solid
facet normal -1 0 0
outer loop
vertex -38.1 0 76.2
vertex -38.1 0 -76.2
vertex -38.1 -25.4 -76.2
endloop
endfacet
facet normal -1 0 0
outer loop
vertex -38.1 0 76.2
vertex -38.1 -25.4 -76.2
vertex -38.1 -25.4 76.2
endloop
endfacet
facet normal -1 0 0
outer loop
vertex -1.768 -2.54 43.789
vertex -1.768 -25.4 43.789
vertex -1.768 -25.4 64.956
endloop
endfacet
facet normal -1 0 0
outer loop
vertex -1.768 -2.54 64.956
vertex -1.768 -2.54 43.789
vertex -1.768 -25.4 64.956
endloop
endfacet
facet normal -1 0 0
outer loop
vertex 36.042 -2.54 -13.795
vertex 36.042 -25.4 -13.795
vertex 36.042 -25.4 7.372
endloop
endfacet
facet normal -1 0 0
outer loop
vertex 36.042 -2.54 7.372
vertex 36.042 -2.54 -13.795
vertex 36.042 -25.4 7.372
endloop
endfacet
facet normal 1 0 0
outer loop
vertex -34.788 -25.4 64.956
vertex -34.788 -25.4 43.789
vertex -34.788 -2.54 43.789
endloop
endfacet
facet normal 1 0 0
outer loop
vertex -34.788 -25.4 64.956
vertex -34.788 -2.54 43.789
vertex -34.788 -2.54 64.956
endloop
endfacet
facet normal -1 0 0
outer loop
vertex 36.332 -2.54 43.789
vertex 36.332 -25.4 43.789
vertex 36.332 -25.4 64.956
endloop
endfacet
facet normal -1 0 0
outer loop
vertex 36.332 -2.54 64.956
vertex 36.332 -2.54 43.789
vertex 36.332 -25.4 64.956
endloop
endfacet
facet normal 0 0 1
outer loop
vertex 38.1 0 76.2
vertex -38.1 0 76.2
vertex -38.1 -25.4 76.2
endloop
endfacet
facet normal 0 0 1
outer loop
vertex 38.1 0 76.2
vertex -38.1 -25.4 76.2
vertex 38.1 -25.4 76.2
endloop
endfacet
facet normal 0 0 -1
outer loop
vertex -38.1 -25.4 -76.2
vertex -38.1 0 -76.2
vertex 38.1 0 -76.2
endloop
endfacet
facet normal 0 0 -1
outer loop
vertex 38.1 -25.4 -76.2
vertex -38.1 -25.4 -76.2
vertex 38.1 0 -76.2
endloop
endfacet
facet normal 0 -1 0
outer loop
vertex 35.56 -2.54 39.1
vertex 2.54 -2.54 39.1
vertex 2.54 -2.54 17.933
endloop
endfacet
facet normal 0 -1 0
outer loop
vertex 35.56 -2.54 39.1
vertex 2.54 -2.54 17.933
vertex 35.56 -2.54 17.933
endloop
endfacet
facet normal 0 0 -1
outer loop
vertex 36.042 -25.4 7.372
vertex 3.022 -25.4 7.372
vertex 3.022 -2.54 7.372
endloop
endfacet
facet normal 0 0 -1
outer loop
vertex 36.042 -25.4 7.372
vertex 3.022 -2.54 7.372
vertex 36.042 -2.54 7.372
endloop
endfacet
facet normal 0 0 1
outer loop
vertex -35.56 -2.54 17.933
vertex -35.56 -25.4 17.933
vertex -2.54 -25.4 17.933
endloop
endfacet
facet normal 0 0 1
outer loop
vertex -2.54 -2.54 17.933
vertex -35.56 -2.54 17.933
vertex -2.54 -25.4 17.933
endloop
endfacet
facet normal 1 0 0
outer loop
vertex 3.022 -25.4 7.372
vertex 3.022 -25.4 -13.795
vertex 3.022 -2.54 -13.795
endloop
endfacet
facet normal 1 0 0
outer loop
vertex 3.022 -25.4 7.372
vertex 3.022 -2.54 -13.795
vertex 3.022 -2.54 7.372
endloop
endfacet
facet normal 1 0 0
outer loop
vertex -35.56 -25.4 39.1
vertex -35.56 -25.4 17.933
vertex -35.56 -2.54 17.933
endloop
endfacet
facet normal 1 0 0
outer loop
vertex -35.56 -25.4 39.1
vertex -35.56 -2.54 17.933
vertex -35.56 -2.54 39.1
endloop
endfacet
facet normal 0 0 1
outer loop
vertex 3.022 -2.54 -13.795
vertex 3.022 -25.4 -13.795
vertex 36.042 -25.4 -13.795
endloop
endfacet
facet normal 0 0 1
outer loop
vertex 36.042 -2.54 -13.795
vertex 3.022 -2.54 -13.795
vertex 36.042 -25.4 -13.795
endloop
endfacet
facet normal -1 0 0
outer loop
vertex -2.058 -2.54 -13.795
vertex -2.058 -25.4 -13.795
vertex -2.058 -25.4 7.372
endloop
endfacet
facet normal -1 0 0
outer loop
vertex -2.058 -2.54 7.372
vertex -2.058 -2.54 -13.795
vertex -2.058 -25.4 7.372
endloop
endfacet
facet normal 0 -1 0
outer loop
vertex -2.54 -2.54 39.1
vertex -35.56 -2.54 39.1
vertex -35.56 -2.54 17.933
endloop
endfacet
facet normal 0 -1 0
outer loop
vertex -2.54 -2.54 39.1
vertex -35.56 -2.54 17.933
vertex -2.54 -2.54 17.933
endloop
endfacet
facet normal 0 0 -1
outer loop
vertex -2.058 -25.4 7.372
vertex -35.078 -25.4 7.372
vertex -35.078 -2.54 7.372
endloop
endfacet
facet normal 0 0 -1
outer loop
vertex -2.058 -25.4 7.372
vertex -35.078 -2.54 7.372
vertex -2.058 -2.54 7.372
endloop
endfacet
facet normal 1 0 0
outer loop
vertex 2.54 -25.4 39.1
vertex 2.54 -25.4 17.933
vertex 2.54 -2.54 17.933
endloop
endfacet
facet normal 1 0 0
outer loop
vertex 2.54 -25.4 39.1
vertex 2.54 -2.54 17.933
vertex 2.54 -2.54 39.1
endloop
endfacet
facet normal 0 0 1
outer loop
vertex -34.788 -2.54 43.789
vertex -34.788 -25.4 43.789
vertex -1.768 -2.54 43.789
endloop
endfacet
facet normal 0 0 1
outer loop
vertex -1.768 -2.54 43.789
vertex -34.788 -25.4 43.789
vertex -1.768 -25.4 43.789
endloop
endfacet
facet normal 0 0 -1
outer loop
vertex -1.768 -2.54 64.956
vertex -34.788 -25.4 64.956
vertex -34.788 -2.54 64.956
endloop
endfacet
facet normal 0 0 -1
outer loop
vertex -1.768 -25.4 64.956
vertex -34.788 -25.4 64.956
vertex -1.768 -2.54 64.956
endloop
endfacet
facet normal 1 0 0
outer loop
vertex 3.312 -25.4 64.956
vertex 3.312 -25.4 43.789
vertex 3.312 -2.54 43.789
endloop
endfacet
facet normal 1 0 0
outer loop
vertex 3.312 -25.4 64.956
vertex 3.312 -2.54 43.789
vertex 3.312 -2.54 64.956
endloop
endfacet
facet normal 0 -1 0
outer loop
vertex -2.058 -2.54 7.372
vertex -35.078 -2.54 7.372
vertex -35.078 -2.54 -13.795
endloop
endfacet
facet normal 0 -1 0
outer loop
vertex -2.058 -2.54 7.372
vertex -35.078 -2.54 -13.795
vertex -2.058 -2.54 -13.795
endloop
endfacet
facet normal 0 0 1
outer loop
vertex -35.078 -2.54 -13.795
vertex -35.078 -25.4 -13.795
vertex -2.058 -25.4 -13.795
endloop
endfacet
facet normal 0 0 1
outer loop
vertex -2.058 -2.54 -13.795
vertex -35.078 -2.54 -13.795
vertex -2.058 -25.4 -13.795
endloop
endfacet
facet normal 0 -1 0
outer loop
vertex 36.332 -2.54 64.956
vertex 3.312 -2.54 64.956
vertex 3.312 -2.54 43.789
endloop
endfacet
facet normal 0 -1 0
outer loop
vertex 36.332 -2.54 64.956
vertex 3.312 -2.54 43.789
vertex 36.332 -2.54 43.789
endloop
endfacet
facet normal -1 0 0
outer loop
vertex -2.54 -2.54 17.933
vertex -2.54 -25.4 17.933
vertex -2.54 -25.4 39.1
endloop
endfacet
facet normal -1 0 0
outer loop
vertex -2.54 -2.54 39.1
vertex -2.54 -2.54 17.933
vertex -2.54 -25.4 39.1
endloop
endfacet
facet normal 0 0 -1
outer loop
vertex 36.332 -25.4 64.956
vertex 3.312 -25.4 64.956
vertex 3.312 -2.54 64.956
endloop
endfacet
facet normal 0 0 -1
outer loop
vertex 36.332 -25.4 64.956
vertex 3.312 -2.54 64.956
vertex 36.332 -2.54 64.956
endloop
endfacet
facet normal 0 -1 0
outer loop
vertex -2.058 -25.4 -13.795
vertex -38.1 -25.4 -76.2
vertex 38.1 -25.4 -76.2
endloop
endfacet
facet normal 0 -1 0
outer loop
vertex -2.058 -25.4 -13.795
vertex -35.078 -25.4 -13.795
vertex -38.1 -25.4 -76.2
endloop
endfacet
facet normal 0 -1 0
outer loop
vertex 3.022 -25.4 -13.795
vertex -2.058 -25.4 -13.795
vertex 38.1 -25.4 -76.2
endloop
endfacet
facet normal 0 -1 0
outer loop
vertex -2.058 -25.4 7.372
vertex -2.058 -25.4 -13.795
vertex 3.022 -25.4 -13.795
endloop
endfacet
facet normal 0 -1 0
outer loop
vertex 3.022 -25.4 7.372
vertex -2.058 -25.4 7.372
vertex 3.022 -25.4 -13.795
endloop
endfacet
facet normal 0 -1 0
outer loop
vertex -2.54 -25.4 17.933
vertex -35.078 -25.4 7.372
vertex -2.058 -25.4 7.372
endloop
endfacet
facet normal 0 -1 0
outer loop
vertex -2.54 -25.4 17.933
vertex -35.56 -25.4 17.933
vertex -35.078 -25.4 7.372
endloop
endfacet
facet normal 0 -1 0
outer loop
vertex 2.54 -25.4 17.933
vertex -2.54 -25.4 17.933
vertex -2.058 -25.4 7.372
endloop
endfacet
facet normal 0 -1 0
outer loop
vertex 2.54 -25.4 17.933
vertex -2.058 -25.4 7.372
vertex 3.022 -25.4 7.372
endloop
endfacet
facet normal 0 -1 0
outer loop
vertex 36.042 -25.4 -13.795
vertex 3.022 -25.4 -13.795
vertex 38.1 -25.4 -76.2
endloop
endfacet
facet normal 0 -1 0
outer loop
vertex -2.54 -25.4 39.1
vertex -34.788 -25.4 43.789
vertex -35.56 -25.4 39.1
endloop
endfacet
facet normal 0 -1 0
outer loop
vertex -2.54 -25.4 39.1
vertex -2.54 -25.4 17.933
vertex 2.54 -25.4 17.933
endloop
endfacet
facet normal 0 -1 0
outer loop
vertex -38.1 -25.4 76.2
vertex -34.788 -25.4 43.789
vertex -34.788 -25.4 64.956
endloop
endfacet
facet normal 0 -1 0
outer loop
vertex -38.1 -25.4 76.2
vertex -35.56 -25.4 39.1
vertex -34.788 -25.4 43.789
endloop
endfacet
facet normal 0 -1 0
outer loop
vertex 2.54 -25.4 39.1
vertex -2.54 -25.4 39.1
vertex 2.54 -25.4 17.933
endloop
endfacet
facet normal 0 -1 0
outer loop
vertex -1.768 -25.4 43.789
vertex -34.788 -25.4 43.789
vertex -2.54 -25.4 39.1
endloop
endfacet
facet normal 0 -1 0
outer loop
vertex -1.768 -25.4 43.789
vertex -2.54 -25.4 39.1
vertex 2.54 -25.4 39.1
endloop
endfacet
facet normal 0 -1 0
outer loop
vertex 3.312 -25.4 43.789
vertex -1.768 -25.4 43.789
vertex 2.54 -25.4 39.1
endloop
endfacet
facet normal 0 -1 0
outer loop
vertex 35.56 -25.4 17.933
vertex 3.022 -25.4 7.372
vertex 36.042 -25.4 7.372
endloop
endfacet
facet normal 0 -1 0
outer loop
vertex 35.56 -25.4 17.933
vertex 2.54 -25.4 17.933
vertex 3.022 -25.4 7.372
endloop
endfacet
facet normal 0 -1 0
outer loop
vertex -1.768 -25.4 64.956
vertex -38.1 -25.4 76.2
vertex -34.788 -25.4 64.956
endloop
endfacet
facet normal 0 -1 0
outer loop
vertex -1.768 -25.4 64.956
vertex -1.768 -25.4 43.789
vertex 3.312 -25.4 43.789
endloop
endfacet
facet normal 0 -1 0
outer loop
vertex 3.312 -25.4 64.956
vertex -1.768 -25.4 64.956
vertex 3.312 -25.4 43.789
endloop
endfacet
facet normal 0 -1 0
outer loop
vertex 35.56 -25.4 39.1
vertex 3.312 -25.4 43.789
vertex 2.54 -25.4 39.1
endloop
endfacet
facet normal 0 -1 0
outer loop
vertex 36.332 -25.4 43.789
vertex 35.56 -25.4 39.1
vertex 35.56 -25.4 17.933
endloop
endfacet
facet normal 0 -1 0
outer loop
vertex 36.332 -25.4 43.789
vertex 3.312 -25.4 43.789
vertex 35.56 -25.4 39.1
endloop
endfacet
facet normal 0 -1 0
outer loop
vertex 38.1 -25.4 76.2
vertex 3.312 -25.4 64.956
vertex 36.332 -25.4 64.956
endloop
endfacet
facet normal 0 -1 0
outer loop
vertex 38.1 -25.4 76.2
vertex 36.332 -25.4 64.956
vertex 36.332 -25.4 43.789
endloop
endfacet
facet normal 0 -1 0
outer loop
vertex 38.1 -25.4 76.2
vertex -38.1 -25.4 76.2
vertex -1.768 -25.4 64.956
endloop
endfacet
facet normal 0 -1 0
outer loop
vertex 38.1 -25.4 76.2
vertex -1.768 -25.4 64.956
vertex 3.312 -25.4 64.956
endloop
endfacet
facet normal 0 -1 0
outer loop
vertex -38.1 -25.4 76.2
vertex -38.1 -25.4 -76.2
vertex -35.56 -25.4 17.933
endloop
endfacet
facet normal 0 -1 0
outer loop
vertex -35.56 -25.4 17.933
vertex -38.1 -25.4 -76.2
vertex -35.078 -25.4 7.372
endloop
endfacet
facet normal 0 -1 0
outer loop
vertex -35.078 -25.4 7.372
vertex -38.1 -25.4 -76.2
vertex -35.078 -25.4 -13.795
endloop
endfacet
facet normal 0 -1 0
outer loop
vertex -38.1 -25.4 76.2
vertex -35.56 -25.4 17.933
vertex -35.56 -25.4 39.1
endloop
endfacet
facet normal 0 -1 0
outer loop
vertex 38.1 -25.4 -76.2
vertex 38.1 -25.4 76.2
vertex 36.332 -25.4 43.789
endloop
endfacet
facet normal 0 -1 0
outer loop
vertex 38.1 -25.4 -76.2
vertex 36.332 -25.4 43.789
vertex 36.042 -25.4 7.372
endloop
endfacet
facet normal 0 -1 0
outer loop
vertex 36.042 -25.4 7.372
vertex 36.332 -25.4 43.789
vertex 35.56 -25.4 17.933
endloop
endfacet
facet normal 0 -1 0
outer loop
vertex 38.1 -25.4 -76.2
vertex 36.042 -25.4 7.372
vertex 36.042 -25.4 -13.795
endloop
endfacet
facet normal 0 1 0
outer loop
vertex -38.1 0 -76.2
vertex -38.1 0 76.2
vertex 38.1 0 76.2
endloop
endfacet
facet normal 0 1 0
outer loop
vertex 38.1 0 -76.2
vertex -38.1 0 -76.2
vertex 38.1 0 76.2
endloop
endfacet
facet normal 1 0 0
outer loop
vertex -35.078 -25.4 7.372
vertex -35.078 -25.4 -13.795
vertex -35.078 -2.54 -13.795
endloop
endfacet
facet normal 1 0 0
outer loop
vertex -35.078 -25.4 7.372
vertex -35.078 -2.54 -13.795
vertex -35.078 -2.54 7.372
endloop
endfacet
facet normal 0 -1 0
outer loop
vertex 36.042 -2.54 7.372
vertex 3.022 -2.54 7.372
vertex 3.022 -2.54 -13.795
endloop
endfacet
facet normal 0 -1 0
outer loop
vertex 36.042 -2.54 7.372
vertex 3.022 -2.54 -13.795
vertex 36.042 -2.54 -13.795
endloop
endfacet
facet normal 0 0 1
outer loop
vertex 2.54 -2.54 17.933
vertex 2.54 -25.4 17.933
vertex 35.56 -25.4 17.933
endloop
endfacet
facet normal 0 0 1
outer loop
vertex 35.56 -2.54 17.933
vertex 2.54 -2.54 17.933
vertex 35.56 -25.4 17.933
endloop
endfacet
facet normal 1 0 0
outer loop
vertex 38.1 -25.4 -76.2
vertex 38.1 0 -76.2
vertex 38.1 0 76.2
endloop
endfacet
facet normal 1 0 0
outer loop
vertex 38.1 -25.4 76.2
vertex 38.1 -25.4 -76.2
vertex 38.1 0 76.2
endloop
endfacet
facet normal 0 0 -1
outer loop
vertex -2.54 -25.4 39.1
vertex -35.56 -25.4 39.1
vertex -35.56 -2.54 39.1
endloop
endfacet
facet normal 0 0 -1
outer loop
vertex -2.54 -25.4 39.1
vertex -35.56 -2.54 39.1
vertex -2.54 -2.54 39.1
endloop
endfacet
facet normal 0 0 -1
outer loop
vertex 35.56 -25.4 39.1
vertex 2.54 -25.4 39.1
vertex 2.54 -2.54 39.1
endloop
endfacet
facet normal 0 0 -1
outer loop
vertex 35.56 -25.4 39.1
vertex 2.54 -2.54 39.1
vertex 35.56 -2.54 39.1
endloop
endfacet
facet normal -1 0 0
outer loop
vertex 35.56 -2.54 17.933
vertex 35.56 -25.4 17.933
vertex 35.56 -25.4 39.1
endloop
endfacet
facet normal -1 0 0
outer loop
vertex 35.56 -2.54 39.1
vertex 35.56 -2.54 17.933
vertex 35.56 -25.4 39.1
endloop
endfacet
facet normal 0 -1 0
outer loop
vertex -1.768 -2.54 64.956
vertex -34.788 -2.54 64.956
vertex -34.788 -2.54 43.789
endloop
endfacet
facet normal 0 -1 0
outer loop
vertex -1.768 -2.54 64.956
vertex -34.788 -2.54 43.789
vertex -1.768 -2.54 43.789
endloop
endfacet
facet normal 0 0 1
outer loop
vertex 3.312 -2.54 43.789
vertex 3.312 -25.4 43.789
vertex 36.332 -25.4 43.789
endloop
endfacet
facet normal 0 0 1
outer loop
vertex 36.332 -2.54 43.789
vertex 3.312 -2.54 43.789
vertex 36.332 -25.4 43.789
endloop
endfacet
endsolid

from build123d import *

# Parameters (mm, degrees)
F0_W     = 76.2
F0_H     = 152.4
F1_DEPTH = 25.4
F2_W     = 33.02
F2_H     = 21.1666666667
F3_DEPTH = 22.86
F4_DEPTH = 22.86
F5_DEPTH = 22.86


# Not quite as in the source:
# - a feature names something its author has since deleted; it is built from what else it names


with BuildPart() as f1:
    # F0 (on Front) → F1 (new body)
    with BuildSketch(Plane.XZ):
        Rectangle(F0_W, F0_H)
    extrude(amount=F1_DEPTH)

    # F2 (on face) → F3 (cut)
    with BuildSketch(Plane.XZ.offset(25.4)):
        with Locations((-18.2778849706, 54.3725310351)):
            Rectangle(F2_W, F2_H)
    extrude(amount=-F3_DEPTH, mode=Mode.SUBTRACT)

    # F2 (on face) → F4 (cut)
    with BuildSketch(Plane.XZ.offset(25.4)):
        with Locations((19.8221150294, 54.3725310351)):
            Rectangle(F2_W, F2_H)
        with Locations((-19.05, 28.5166088839)):
            Rectangle(F2_W, F2_H)
        with Locations((-18.5682759488, -3.211494873)):
            Rectangle(F2_W, F2_H)
        with Locations((19.5317240512, -3.211494873)):
            Rectangle(F2_W, F2_H)
    extrude(amount=-F4_DEPTH, mode=Mode.SUBTRACT)

    # F2 (on face) → F5 (cut)
    with BuildSketch(Plane.XZ.offset(25.4)):
        with Locations((19.05, 28.5166088839)):
            Rectangle(F2_W, F2_H)
    extrude(amount=-F5_DEPTH, mode=Mode.SUBTRACT)


solid = f1.part
